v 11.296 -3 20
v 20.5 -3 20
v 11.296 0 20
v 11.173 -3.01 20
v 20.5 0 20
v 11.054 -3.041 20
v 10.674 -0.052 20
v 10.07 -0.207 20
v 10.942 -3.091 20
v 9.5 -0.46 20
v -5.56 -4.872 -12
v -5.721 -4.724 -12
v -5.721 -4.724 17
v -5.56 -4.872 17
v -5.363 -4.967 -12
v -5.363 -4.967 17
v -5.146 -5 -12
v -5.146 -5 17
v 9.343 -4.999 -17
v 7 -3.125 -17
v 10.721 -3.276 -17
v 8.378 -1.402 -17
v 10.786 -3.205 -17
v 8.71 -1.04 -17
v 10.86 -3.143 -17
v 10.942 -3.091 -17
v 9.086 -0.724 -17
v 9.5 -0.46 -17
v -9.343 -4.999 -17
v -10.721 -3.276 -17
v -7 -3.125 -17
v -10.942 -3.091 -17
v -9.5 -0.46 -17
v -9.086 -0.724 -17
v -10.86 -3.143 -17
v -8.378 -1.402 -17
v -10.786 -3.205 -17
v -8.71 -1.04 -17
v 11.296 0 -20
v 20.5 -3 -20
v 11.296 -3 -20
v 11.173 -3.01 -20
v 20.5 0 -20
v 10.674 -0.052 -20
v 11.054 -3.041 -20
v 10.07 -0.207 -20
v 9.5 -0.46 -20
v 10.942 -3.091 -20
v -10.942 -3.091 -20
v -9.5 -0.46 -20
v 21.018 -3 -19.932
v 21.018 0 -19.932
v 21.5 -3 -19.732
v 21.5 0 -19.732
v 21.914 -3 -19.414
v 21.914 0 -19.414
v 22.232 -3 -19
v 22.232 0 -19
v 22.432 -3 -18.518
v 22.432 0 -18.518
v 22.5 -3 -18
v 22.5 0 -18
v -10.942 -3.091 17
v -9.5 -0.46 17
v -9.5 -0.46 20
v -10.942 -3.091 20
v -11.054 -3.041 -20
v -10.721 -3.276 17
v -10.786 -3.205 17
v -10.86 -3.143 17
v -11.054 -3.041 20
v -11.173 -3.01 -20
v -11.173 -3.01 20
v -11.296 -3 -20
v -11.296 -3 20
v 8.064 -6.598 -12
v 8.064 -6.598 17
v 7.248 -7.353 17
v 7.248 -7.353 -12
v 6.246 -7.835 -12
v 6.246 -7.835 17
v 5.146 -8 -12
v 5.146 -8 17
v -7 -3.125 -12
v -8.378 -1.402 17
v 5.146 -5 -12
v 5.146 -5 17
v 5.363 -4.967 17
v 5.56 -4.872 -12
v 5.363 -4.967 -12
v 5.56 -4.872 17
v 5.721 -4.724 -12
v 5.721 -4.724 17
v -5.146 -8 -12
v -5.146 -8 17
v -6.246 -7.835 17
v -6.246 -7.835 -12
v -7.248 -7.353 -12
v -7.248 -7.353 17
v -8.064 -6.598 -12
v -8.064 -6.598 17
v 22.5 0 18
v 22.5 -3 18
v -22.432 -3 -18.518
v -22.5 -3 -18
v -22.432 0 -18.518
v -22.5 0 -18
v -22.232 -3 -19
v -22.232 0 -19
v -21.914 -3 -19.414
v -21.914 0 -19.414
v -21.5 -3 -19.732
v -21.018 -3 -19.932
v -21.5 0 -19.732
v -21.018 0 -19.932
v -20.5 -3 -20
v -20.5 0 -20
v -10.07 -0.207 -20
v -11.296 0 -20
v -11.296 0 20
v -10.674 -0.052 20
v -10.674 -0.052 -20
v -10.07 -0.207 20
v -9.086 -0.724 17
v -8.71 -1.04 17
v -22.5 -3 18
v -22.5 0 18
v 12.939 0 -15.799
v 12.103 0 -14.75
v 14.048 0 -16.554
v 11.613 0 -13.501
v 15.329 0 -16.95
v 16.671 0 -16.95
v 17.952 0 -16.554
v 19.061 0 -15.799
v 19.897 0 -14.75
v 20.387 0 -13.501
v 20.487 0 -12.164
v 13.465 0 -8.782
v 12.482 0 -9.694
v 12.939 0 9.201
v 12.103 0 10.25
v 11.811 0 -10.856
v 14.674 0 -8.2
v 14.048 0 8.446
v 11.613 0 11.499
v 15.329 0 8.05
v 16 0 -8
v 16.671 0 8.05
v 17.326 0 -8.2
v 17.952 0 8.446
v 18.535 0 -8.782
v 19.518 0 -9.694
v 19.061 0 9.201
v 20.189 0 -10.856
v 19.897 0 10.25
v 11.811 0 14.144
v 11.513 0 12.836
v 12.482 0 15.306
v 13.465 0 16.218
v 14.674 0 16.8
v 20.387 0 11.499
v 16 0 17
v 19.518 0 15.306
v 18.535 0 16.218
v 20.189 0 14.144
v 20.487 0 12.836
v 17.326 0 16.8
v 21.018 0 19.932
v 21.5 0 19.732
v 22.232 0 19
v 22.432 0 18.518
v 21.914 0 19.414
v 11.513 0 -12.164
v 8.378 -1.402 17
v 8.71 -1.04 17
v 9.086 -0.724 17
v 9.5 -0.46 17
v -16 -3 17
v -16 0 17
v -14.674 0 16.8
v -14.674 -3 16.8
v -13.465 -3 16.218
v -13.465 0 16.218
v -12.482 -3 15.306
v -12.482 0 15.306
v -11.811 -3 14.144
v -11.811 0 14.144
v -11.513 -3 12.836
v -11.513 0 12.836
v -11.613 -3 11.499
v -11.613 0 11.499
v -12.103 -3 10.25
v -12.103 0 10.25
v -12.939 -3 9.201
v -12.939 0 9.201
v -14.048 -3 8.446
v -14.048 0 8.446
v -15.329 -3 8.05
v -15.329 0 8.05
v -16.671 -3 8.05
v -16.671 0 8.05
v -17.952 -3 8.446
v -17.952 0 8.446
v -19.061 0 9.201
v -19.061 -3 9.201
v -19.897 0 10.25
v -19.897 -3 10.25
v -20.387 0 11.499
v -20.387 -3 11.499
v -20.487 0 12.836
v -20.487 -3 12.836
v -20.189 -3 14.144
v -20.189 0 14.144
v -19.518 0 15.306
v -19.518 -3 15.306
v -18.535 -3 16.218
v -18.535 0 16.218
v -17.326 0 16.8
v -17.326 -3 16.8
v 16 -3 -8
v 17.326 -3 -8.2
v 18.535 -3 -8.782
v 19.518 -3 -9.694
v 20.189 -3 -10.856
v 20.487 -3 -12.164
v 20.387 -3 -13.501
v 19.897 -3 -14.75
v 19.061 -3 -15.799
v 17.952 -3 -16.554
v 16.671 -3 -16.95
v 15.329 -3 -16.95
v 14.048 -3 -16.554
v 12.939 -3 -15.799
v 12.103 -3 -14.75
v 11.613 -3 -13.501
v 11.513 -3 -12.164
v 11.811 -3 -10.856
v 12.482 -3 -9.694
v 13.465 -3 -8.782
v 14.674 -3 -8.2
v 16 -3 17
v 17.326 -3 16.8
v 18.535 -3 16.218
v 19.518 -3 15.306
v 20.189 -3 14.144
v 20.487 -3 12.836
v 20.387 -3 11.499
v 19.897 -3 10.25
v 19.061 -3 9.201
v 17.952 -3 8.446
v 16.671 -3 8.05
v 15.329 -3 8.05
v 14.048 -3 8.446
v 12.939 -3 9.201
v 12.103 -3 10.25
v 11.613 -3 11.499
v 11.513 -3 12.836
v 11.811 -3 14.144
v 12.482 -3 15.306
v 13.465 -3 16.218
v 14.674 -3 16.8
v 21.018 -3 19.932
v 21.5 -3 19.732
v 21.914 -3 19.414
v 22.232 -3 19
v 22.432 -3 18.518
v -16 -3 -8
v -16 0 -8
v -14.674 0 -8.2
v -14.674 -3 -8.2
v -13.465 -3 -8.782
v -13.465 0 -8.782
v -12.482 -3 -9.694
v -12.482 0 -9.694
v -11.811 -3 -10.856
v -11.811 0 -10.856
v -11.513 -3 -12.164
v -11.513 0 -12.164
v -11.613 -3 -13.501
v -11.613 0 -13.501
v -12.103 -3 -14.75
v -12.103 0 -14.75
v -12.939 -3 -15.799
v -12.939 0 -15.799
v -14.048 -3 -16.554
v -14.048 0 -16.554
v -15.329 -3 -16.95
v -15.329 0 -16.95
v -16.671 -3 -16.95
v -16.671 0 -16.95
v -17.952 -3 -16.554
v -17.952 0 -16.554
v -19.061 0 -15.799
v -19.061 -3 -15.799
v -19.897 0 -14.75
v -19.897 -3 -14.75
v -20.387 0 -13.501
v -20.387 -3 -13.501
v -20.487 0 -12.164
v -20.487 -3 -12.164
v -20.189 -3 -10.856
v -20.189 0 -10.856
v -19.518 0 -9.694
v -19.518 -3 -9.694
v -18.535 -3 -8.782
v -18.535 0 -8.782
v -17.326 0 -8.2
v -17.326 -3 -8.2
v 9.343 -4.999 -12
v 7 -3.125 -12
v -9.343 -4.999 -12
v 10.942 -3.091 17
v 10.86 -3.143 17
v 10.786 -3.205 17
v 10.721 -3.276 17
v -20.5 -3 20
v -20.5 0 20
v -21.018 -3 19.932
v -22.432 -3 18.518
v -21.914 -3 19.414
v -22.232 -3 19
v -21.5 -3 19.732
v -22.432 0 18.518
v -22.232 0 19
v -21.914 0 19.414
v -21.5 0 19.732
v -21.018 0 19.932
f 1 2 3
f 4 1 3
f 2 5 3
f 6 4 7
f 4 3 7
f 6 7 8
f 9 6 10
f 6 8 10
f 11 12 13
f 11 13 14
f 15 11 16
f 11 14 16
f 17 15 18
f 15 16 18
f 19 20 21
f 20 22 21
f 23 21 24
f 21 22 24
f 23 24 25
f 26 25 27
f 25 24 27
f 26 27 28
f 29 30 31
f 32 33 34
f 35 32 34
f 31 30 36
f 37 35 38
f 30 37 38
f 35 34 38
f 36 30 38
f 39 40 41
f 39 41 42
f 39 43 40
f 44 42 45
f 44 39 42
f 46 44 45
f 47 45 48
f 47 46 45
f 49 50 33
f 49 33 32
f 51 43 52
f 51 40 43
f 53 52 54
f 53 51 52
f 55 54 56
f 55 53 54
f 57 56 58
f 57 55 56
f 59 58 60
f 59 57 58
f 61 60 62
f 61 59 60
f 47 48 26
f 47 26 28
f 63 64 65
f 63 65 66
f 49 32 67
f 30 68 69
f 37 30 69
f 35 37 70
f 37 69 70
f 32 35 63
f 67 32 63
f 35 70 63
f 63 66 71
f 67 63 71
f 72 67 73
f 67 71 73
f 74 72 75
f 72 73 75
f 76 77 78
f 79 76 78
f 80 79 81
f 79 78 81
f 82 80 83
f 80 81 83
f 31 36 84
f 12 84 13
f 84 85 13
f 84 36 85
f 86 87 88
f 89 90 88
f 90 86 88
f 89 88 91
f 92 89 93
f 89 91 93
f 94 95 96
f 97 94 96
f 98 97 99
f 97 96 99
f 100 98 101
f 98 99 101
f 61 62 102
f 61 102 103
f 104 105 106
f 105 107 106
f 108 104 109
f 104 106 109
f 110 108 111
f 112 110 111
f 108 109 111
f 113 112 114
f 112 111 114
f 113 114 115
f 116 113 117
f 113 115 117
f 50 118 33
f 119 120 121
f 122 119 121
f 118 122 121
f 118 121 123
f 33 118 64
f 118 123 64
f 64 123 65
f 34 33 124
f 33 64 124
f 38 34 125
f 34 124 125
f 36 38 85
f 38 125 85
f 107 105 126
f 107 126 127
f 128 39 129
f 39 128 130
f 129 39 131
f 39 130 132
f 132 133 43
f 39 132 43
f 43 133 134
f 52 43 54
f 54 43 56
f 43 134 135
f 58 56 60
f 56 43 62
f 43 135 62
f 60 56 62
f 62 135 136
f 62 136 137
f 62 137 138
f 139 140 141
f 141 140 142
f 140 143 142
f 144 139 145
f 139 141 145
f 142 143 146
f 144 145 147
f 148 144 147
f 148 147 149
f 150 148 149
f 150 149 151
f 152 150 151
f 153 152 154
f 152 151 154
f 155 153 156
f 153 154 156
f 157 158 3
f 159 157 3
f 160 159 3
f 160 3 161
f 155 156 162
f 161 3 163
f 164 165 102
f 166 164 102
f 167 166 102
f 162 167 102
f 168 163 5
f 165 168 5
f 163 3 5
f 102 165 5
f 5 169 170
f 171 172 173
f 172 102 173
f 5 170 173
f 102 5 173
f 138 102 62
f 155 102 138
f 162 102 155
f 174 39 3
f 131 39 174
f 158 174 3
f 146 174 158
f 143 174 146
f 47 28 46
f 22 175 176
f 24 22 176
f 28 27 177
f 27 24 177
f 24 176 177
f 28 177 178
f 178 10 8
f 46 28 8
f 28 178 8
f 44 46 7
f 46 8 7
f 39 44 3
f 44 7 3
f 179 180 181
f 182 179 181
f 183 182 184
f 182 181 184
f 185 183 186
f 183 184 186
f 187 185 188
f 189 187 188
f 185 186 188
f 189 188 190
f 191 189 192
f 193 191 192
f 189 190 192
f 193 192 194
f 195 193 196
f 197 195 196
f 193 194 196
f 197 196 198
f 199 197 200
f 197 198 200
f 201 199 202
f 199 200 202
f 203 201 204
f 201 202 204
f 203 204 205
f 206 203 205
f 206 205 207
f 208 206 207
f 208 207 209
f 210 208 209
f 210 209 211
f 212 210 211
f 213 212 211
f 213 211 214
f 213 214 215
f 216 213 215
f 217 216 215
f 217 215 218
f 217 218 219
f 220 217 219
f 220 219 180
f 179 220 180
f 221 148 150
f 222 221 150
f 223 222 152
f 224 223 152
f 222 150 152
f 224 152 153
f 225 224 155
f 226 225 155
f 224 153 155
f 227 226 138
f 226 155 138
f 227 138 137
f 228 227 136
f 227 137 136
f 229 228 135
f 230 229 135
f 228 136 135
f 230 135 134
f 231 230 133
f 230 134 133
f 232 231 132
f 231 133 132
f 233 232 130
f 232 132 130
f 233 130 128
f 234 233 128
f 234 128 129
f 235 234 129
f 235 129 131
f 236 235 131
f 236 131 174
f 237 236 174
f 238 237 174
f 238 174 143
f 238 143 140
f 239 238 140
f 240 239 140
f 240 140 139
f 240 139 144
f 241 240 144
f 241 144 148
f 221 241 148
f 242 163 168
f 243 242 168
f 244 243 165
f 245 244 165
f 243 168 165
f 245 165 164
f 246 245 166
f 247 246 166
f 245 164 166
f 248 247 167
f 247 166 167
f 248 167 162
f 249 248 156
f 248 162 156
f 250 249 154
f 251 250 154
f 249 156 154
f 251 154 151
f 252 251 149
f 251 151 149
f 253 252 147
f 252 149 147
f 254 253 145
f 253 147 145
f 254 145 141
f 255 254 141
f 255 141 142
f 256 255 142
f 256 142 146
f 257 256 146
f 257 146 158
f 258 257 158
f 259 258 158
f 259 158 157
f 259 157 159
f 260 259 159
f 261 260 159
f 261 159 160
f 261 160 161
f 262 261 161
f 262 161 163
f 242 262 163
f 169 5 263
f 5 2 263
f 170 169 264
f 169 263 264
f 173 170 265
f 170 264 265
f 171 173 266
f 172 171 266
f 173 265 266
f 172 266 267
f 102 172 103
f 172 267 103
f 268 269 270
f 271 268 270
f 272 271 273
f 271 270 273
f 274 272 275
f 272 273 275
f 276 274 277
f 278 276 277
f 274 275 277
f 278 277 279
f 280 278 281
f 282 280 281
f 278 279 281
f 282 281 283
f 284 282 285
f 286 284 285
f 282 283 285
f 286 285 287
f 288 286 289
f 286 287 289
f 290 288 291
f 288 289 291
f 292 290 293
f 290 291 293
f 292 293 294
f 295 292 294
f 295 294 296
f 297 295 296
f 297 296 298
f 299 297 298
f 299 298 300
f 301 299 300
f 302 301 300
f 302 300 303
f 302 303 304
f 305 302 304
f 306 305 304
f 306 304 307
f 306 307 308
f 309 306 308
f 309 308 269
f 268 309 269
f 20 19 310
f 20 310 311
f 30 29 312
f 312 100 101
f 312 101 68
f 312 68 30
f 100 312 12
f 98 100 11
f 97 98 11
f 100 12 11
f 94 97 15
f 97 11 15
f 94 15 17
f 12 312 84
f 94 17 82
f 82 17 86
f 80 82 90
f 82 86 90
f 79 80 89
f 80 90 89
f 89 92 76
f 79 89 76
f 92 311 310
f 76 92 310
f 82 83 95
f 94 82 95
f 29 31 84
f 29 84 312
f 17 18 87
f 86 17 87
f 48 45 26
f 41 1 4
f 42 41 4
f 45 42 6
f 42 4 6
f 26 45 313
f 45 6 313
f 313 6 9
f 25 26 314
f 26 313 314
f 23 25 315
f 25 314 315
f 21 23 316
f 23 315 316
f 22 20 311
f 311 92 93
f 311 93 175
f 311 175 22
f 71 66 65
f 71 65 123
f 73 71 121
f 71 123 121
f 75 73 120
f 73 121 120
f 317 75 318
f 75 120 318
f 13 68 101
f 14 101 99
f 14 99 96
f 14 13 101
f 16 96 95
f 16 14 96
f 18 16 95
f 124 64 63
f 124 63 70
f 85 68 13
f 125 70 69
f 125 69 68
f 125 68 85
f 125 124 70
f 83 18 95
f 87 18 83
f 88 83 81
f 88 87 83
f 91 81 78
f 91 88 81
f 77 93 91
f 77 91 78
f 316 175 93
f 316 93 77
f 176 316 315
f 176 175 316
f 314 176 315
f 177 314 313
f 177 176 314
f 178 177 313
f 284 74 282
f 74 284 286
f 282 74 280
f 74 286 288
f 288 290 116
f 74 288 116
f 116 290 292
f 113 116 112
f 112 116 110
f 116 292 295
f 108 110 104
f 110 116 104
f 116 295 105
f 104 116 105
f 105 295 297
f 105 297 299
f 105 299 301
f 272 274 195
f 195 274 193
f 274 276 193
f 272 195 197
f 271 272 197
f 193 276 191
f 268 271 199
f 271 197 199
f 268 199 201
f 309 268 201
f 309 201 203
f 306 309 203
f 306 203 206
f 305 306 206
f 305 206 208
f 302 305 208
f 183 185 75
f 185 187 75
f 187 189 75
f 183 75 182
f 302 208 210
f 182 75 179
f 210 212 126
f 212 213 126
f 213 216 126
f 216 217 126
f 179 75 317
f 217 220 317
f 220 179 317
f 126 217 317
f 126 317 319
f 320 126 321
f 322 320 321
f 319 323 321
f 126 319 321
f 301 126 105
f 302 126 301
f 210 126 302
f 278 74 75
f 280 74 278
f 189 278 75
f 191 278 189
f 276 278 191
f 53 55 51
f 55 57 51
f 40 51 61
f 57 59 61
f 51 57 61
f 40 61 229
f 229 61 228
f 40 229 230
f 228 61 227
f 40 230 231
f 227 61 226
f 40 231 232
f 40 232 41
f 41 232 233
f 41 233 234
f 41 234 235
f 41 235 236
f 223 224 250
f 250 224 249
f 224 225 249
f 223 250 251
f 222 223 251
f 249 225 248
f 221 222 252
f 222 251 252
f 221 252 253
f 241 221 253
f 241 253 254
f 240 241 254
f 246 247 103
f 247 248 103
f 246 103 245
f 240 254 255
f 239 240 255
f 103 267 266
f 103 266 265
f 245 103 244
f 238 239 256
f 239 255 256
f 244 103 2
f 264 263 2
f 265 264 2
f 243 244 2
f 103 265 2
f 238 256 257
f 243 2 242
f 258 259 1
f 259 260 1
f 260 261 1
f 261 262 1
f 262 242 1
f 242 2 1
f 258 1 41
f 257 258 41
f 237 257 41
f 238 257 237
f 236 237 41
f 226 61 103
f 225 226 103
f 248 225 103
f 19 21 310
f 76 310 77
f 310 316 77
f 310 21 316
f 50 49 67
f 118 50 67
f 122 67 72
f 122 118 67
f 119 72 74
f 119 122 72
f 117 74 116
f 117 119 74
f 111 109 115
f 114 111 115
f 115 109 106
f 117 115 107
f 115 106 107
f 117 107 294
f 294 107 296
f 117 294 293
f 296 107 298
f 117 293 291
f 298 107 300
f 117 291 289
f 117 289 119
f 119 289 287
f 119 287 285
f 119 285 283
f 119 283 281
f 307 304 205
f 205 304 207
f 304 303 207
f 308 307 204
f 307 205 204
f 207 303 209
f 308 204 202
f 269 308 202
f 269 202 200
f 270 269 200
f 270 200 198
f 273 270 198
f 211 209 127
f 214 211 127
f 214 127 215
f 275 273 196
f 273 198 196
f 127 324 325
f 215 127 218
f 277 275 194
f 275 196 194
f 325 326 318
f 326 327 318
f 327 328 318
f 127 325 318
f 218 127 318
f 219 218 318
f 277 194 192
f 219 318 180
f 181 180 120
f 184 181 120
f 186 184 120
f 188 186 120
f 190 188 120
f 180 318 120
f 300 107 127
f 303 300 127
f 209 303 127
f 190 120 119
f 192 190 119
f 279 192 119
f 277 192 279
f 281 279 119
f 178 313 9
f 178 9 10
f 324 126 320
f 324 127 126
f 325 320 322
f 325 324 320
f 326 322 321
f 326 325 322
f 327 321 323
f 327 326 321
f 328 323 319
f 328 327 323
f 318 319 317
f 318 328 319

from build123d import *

# Parameters (mm, degrees)
BRIDA_BASE2_DEPTH       = 20
CORTAR_EXTRUIR1_START   = -20
CORTAR_EXTRUIR1_DEPTH   = 8
CORTAR_EXTRUIR1_START_2 = 17
CORTAR_EXTRUIR1_2_DEPTH = 3
CORTAR_EXTRUIR1_3_DEPTH = 3
CORTAR_EXTRUIR2_REACH   = 33.149
CROQUIS13_R             = 4.5
REDONDEO1_R             = 2


# Read off the part's stored shape, not the designer's step: Cortar-Extruir1
# Sheet-metal steps are written as plain solids
with BuildPart() as part:
    # Croquis9 → Brida base2 (new, symmetric)
    with BuildSketch(Plane.XY):
        with BuildLine():
            Line((-22.5, 0), (-11.295902805, 0))
            ThreePointArc((-11.295902805, 0), (-9.677249795, -0.368790327), (-8.378108412, -1.402364485))
            Line((-8.378108412, -1.402364485), (-5.721159702, -4.723550372))
            ThreePointArc((-5.721159702, -4.723550372), (-5.465058556, -4.927299964), (-5.145971737, -5))
            Line((-5.145971737, -5), (5.145971737, -5))
            ThreePointArc((5.145971737, -5), (5.465058556, -4.927299964), (5.721159702, -4.723550372))
            Line((5.721159702, -4.723550372), (8.378108412, -1.402364485))
            ThreePointArc((8.378108412, -1.402364485), (9.677249795, -0.368790327), (11.295902805, 0))
            Line((11.295902805, 0), (22.5, 0))
            Line((22.5, 0), (22.5, -3))
            Line((22.5, -3), (11.295902805, -3))
            ThreePointArc((11.295902805, -3), (10.976815986, -3.072700036), (10.72071484, -3.276449628))
            Line((10.72071484, -3.276449628), (8.063766131, -6.597635515))
            ThreePointArc((8.063766131, -6.597635515), (6.764624748, -7.631209673), (5.145971737, -8))
            Line((5.145971737, -8), (-5.145971737, -8))
            ThreePointArc((-5.145971737, -8), (-6.764624748, -7.631209673), (-8.063766131, -6.597635515))
            Line((-8.063766131, -6.597635515), (-10.72071484, -3.276449628))
            ThreePointArc((-10.72071484, -3.276449628), (-10.976815986, -3.072700036), (-11.295902805, -3))
            Line((-11.295902805, -3), (-22.5, -3))
            Line((-22.5, -3), (-22.5, 0))
        make_face()
    extrude(amount=BRIDA_BASE2_DEPTH, both=True)

    # Cortar-Extruir1 outline → Cortar-Extruir1 (cut)
    with BuildSketch(Plane.XY.offset(CORTAR_EXTRUIR1_START)):
        with BuildLine():
            Line((8.063766131, -6.597635515), (9.342606428, -4.999085143))
            Line((9.342606428, -4.999085143), (7, -3.125))
            Line((7, -3.125), (5.721159702, -4.723550372))
            ThreePointArc((5.721159702, -4.723550372), (5.465058556, -4.927299964), (5.145971737, -5))
            Line((5.145971737, -5), (-5.145971737, -5))
            ThreePointArc((-5.145971737, -5), (-5.465058556, -4.927299964), (-5.721159702, -4.723550372))
            Line((-5.721159702, -4.723550372), (-7, -3.125))
            Line((-7, -3.125), (-9.342606428, -4.999085143))
            Line((-9.342606428, -4.999085143), (-8.063766131, -6.597635515))
            ThreePointArc((-8.063766131, -6.597635515), (-6.764624748, -7.631209673), (-5.145971737, -8))
            Line((-5.145971737, -8), (5.145971737, -8))
            ThreePointArc((5.145971737, -8), (6.764624748, -7.631209673), (8.063766131, -6.597635515))
        make_face()
    extrude(amount=CORTAR_EXTRUIR1_DEPTH, mode=Mode.SUBTRACT)

    # Cortar-Extruir1 2 outline → Cortar-Extruir1 2 (cut)
    with BuildSketch(Plane.XY.offset(CORTAR_EXTRUIR1_START_2)):
        with BuildLine():
            Line((8.063766131, -6.597635515), (10.72071484, -3.276449628))
            ThreePointArc((10.72071484, -3.276449628), (10.82209851, -3.172606162), (10.941874542, -3.090656079))
            Line((10.941874542, -3.090656079), (9.5, -0.459877144))
            ThreePointArc((9.5, -0.459877144), (8.892404123, -0.8755908), (8.378108412, -1.402364485))
            Line((8.378108412, -1.402364485), (5.721159702, -4.723550372))
            ThreePointArc((5.721159702, -4.723550372), (5.465058556, -4.927299964), (5.145971737, -5))
            Line((5.145971737, -5), (-5.145971737, -5))
            ThreePointArc((-5.145971737, -5), (-5.465058556, -4.927299964), (-5.721159702, -4.723550372))
            Line((-5.721159702, -4.723550372), (-8.378108412, -1.402364485))
            ThreePointArc((-8.378108412, -1.402364485), (-8.892404123, -0.8755908), (-9.5, -0.459877144))
            Line((-9.5, -0.459877144), (-10.941874542, -3.090656079))
            ThreePointArc((-10.941874542, -3.090656079), (-10.82209851, -3.172606162), (-10.72071484, -3.276449628))
            Line((-10.72071484, -3.276449628), (-8.063766131, -6.597635515))
            ThreePointArc((-8.063766131, -6.597635515), (-6.764624748, -7.631209673), (-5.145971737, -8))
            Line((-5.145971737, -8), (5.145971737, -8))
            ThreePointArc((5.145971737, -8), (6.764624748, -7.631209673), (8.063766131, -6.597635515))
        make_face()
    extrude(amount=CORTAR_EXTRUIR1_2_DEPTH, mode=Mode.SUBTRACT)

    # Cortar-Extruir1 3 outline → Cortar-Extruir1 3 (cut)
    with BuildSketch(Plane.XY.offset(CORTAR_EXTRUIR1_START)):
        with BuildLine():
            Line((7, -3.125), (9.342606428, -4.999085143))
            Line((9.342606428, -4.999085143), (10.72071484, -3.276449628))
            ThreePointArc((10.72071484, -3.276449628), (10.82209851, -3.172606162), (10.941874542, -3.090656079))
            Line((10.941874542, -3.090656079), (9.5, -0.459877144))
            ThreePointArc((9.5, -0.459877144), (8.892404123, -0.8755908), (8.378108412, -1.402364485))
            Line((8.378108412, -1.402364485), (7, -3.125))
        make_face()
        with BuildLine():
            Line((-10.72071484, -3.276449628), (-9.342606428, -4.999085143))
            Line((-9.342606428, -4.999085143), (-7, -3.125))
            Line((-7, -3.125), (-8.378108412, -1.402364485))
            ThreePointArc((-8.378108412, -1.402364485), (-8.892404123, -0.8755908), (-9.5, -0.459877144))
            Line((-9.5, -0.459877144), (-10.941874542, -3.090656079))
            ThreePointArc((-10.941874542, -3.090656079), (-10.82209851, -3.172606162), (-10.72071484, -3.276449628))
        make_face()
    extrude(amount=CORTAR_EXTRUIR1_3_DEPTH, mode=Mode.SUBTRACT)

    # Croquis13 → Cortar-Extruir2 (cut, up to next)
    with BuildSketch(Plane(origin=(0, 0, 0), x_dir=(1, 0, 0), z_dir=(0, 1, 0)), mode=Mode.PRIVATE) as cortar_extruir2_sk1:
        with Locations(Location((-16, 12.5, 0), (0, 0, 270))):
            Circle(CROQUIS13_R)
    cortar_extruir2_tool1 = extrude(cortar_extruir2_sk1.sketch, amount=-CORTAR_EXTRUIR2_REACH, mode=Mode.PRIVATE) & part.part
    # Croquis13 → Cortar-Extruir2 (cut, up to next)
    with BuildSketch(Plane(origin=(0, 0, 0), x_dir=(1, 0, 0), z_dir=(0, 1, 0)), mode=Mode.PRIVATE) as cortar_extruir2_sk2:
        with Locations(Location((16, 12.5, 0), (0, 0, 270))):
            Circle(CROQUIS13_R)
    cortar_extruir2_tool2 = extrude(cortar_extruir2_sk2.sketch, amount=-CORTAR_EXTRUIR2_REACH, mode=Mode.PRIVATE) & part.part
    # Croquis13 → Cortar-Extruir2 (cut, up to next)
    with BuildSketch(Plane(origin=(0, 0, 0), x_dir=(1, 0, 0), z_dir=(0, 1, 0)), mode=Mode.PRIVATE) as cortar_extruir2_sk3:
        with Locations(Location((16, -12.5, 0), (0, 0, 270))):
            Circle(CROQUIS13_R)
    cortar_extruir2_tool3 = extrude(cortar_extruir2_sk3.sketch, amount=-CORTAR_EXTRUIR2_REACH, mode=Mode.PRIVATE) & part.part
    # Croquis13 → Cortar-Extruir2 (cut, up to next)
    with BuildSketch(Plane(origin=(0, 0, 0), x_dir=(1, 0, 0), z_dir=(0, 1, 0)), mode=Mode.PRIVATE) as cortar_extruir2_sk4:
        with Locations(Location((-16, -12.5, 0), (0, 0, 270))):
            Circle(CROQUIS13_R)
    cortar_extruir2_tool4 = extrude(cortar_extruir2_sk4.sketch, amount=-CORTAR_EXTRUIR2_REACH, mode=Mode.PRIVATE) & part.part
    add(cortar_extruir2_tool1.solids().sort_by_distance((-16, 0, -12.5))[0], mode=Mode.SUBTRACT)
    add(cortar_extruir2_tool2.solids().sort_by_distance((16, 0, -12.5))[0], mode=Mode.SUBTRACT)
    add(cortar_extruir2_tool3.solids().sort_by_distance((16, 0, 12.5))[0], mode=Mode.SUBTRACT)
    add(cortar_extruir2_tool4.solids().sort_by_distance((-16, 0, 12.5))[0], mode=Mode.SUBTRACT)

    # Redondeo1
    redondeo1_edges = [part.edges().sort_by_distance(p)[0] for p in [
        (22.5, -1.5, -20),
        (-22.5, -1.5, -20),
        (22.5, -1.5, 20),
        (-22.5, -1.5, 20),
    ]]
    fillet(redondeo1_edges, radius=REDONDEO1_R)


solid = part.part
